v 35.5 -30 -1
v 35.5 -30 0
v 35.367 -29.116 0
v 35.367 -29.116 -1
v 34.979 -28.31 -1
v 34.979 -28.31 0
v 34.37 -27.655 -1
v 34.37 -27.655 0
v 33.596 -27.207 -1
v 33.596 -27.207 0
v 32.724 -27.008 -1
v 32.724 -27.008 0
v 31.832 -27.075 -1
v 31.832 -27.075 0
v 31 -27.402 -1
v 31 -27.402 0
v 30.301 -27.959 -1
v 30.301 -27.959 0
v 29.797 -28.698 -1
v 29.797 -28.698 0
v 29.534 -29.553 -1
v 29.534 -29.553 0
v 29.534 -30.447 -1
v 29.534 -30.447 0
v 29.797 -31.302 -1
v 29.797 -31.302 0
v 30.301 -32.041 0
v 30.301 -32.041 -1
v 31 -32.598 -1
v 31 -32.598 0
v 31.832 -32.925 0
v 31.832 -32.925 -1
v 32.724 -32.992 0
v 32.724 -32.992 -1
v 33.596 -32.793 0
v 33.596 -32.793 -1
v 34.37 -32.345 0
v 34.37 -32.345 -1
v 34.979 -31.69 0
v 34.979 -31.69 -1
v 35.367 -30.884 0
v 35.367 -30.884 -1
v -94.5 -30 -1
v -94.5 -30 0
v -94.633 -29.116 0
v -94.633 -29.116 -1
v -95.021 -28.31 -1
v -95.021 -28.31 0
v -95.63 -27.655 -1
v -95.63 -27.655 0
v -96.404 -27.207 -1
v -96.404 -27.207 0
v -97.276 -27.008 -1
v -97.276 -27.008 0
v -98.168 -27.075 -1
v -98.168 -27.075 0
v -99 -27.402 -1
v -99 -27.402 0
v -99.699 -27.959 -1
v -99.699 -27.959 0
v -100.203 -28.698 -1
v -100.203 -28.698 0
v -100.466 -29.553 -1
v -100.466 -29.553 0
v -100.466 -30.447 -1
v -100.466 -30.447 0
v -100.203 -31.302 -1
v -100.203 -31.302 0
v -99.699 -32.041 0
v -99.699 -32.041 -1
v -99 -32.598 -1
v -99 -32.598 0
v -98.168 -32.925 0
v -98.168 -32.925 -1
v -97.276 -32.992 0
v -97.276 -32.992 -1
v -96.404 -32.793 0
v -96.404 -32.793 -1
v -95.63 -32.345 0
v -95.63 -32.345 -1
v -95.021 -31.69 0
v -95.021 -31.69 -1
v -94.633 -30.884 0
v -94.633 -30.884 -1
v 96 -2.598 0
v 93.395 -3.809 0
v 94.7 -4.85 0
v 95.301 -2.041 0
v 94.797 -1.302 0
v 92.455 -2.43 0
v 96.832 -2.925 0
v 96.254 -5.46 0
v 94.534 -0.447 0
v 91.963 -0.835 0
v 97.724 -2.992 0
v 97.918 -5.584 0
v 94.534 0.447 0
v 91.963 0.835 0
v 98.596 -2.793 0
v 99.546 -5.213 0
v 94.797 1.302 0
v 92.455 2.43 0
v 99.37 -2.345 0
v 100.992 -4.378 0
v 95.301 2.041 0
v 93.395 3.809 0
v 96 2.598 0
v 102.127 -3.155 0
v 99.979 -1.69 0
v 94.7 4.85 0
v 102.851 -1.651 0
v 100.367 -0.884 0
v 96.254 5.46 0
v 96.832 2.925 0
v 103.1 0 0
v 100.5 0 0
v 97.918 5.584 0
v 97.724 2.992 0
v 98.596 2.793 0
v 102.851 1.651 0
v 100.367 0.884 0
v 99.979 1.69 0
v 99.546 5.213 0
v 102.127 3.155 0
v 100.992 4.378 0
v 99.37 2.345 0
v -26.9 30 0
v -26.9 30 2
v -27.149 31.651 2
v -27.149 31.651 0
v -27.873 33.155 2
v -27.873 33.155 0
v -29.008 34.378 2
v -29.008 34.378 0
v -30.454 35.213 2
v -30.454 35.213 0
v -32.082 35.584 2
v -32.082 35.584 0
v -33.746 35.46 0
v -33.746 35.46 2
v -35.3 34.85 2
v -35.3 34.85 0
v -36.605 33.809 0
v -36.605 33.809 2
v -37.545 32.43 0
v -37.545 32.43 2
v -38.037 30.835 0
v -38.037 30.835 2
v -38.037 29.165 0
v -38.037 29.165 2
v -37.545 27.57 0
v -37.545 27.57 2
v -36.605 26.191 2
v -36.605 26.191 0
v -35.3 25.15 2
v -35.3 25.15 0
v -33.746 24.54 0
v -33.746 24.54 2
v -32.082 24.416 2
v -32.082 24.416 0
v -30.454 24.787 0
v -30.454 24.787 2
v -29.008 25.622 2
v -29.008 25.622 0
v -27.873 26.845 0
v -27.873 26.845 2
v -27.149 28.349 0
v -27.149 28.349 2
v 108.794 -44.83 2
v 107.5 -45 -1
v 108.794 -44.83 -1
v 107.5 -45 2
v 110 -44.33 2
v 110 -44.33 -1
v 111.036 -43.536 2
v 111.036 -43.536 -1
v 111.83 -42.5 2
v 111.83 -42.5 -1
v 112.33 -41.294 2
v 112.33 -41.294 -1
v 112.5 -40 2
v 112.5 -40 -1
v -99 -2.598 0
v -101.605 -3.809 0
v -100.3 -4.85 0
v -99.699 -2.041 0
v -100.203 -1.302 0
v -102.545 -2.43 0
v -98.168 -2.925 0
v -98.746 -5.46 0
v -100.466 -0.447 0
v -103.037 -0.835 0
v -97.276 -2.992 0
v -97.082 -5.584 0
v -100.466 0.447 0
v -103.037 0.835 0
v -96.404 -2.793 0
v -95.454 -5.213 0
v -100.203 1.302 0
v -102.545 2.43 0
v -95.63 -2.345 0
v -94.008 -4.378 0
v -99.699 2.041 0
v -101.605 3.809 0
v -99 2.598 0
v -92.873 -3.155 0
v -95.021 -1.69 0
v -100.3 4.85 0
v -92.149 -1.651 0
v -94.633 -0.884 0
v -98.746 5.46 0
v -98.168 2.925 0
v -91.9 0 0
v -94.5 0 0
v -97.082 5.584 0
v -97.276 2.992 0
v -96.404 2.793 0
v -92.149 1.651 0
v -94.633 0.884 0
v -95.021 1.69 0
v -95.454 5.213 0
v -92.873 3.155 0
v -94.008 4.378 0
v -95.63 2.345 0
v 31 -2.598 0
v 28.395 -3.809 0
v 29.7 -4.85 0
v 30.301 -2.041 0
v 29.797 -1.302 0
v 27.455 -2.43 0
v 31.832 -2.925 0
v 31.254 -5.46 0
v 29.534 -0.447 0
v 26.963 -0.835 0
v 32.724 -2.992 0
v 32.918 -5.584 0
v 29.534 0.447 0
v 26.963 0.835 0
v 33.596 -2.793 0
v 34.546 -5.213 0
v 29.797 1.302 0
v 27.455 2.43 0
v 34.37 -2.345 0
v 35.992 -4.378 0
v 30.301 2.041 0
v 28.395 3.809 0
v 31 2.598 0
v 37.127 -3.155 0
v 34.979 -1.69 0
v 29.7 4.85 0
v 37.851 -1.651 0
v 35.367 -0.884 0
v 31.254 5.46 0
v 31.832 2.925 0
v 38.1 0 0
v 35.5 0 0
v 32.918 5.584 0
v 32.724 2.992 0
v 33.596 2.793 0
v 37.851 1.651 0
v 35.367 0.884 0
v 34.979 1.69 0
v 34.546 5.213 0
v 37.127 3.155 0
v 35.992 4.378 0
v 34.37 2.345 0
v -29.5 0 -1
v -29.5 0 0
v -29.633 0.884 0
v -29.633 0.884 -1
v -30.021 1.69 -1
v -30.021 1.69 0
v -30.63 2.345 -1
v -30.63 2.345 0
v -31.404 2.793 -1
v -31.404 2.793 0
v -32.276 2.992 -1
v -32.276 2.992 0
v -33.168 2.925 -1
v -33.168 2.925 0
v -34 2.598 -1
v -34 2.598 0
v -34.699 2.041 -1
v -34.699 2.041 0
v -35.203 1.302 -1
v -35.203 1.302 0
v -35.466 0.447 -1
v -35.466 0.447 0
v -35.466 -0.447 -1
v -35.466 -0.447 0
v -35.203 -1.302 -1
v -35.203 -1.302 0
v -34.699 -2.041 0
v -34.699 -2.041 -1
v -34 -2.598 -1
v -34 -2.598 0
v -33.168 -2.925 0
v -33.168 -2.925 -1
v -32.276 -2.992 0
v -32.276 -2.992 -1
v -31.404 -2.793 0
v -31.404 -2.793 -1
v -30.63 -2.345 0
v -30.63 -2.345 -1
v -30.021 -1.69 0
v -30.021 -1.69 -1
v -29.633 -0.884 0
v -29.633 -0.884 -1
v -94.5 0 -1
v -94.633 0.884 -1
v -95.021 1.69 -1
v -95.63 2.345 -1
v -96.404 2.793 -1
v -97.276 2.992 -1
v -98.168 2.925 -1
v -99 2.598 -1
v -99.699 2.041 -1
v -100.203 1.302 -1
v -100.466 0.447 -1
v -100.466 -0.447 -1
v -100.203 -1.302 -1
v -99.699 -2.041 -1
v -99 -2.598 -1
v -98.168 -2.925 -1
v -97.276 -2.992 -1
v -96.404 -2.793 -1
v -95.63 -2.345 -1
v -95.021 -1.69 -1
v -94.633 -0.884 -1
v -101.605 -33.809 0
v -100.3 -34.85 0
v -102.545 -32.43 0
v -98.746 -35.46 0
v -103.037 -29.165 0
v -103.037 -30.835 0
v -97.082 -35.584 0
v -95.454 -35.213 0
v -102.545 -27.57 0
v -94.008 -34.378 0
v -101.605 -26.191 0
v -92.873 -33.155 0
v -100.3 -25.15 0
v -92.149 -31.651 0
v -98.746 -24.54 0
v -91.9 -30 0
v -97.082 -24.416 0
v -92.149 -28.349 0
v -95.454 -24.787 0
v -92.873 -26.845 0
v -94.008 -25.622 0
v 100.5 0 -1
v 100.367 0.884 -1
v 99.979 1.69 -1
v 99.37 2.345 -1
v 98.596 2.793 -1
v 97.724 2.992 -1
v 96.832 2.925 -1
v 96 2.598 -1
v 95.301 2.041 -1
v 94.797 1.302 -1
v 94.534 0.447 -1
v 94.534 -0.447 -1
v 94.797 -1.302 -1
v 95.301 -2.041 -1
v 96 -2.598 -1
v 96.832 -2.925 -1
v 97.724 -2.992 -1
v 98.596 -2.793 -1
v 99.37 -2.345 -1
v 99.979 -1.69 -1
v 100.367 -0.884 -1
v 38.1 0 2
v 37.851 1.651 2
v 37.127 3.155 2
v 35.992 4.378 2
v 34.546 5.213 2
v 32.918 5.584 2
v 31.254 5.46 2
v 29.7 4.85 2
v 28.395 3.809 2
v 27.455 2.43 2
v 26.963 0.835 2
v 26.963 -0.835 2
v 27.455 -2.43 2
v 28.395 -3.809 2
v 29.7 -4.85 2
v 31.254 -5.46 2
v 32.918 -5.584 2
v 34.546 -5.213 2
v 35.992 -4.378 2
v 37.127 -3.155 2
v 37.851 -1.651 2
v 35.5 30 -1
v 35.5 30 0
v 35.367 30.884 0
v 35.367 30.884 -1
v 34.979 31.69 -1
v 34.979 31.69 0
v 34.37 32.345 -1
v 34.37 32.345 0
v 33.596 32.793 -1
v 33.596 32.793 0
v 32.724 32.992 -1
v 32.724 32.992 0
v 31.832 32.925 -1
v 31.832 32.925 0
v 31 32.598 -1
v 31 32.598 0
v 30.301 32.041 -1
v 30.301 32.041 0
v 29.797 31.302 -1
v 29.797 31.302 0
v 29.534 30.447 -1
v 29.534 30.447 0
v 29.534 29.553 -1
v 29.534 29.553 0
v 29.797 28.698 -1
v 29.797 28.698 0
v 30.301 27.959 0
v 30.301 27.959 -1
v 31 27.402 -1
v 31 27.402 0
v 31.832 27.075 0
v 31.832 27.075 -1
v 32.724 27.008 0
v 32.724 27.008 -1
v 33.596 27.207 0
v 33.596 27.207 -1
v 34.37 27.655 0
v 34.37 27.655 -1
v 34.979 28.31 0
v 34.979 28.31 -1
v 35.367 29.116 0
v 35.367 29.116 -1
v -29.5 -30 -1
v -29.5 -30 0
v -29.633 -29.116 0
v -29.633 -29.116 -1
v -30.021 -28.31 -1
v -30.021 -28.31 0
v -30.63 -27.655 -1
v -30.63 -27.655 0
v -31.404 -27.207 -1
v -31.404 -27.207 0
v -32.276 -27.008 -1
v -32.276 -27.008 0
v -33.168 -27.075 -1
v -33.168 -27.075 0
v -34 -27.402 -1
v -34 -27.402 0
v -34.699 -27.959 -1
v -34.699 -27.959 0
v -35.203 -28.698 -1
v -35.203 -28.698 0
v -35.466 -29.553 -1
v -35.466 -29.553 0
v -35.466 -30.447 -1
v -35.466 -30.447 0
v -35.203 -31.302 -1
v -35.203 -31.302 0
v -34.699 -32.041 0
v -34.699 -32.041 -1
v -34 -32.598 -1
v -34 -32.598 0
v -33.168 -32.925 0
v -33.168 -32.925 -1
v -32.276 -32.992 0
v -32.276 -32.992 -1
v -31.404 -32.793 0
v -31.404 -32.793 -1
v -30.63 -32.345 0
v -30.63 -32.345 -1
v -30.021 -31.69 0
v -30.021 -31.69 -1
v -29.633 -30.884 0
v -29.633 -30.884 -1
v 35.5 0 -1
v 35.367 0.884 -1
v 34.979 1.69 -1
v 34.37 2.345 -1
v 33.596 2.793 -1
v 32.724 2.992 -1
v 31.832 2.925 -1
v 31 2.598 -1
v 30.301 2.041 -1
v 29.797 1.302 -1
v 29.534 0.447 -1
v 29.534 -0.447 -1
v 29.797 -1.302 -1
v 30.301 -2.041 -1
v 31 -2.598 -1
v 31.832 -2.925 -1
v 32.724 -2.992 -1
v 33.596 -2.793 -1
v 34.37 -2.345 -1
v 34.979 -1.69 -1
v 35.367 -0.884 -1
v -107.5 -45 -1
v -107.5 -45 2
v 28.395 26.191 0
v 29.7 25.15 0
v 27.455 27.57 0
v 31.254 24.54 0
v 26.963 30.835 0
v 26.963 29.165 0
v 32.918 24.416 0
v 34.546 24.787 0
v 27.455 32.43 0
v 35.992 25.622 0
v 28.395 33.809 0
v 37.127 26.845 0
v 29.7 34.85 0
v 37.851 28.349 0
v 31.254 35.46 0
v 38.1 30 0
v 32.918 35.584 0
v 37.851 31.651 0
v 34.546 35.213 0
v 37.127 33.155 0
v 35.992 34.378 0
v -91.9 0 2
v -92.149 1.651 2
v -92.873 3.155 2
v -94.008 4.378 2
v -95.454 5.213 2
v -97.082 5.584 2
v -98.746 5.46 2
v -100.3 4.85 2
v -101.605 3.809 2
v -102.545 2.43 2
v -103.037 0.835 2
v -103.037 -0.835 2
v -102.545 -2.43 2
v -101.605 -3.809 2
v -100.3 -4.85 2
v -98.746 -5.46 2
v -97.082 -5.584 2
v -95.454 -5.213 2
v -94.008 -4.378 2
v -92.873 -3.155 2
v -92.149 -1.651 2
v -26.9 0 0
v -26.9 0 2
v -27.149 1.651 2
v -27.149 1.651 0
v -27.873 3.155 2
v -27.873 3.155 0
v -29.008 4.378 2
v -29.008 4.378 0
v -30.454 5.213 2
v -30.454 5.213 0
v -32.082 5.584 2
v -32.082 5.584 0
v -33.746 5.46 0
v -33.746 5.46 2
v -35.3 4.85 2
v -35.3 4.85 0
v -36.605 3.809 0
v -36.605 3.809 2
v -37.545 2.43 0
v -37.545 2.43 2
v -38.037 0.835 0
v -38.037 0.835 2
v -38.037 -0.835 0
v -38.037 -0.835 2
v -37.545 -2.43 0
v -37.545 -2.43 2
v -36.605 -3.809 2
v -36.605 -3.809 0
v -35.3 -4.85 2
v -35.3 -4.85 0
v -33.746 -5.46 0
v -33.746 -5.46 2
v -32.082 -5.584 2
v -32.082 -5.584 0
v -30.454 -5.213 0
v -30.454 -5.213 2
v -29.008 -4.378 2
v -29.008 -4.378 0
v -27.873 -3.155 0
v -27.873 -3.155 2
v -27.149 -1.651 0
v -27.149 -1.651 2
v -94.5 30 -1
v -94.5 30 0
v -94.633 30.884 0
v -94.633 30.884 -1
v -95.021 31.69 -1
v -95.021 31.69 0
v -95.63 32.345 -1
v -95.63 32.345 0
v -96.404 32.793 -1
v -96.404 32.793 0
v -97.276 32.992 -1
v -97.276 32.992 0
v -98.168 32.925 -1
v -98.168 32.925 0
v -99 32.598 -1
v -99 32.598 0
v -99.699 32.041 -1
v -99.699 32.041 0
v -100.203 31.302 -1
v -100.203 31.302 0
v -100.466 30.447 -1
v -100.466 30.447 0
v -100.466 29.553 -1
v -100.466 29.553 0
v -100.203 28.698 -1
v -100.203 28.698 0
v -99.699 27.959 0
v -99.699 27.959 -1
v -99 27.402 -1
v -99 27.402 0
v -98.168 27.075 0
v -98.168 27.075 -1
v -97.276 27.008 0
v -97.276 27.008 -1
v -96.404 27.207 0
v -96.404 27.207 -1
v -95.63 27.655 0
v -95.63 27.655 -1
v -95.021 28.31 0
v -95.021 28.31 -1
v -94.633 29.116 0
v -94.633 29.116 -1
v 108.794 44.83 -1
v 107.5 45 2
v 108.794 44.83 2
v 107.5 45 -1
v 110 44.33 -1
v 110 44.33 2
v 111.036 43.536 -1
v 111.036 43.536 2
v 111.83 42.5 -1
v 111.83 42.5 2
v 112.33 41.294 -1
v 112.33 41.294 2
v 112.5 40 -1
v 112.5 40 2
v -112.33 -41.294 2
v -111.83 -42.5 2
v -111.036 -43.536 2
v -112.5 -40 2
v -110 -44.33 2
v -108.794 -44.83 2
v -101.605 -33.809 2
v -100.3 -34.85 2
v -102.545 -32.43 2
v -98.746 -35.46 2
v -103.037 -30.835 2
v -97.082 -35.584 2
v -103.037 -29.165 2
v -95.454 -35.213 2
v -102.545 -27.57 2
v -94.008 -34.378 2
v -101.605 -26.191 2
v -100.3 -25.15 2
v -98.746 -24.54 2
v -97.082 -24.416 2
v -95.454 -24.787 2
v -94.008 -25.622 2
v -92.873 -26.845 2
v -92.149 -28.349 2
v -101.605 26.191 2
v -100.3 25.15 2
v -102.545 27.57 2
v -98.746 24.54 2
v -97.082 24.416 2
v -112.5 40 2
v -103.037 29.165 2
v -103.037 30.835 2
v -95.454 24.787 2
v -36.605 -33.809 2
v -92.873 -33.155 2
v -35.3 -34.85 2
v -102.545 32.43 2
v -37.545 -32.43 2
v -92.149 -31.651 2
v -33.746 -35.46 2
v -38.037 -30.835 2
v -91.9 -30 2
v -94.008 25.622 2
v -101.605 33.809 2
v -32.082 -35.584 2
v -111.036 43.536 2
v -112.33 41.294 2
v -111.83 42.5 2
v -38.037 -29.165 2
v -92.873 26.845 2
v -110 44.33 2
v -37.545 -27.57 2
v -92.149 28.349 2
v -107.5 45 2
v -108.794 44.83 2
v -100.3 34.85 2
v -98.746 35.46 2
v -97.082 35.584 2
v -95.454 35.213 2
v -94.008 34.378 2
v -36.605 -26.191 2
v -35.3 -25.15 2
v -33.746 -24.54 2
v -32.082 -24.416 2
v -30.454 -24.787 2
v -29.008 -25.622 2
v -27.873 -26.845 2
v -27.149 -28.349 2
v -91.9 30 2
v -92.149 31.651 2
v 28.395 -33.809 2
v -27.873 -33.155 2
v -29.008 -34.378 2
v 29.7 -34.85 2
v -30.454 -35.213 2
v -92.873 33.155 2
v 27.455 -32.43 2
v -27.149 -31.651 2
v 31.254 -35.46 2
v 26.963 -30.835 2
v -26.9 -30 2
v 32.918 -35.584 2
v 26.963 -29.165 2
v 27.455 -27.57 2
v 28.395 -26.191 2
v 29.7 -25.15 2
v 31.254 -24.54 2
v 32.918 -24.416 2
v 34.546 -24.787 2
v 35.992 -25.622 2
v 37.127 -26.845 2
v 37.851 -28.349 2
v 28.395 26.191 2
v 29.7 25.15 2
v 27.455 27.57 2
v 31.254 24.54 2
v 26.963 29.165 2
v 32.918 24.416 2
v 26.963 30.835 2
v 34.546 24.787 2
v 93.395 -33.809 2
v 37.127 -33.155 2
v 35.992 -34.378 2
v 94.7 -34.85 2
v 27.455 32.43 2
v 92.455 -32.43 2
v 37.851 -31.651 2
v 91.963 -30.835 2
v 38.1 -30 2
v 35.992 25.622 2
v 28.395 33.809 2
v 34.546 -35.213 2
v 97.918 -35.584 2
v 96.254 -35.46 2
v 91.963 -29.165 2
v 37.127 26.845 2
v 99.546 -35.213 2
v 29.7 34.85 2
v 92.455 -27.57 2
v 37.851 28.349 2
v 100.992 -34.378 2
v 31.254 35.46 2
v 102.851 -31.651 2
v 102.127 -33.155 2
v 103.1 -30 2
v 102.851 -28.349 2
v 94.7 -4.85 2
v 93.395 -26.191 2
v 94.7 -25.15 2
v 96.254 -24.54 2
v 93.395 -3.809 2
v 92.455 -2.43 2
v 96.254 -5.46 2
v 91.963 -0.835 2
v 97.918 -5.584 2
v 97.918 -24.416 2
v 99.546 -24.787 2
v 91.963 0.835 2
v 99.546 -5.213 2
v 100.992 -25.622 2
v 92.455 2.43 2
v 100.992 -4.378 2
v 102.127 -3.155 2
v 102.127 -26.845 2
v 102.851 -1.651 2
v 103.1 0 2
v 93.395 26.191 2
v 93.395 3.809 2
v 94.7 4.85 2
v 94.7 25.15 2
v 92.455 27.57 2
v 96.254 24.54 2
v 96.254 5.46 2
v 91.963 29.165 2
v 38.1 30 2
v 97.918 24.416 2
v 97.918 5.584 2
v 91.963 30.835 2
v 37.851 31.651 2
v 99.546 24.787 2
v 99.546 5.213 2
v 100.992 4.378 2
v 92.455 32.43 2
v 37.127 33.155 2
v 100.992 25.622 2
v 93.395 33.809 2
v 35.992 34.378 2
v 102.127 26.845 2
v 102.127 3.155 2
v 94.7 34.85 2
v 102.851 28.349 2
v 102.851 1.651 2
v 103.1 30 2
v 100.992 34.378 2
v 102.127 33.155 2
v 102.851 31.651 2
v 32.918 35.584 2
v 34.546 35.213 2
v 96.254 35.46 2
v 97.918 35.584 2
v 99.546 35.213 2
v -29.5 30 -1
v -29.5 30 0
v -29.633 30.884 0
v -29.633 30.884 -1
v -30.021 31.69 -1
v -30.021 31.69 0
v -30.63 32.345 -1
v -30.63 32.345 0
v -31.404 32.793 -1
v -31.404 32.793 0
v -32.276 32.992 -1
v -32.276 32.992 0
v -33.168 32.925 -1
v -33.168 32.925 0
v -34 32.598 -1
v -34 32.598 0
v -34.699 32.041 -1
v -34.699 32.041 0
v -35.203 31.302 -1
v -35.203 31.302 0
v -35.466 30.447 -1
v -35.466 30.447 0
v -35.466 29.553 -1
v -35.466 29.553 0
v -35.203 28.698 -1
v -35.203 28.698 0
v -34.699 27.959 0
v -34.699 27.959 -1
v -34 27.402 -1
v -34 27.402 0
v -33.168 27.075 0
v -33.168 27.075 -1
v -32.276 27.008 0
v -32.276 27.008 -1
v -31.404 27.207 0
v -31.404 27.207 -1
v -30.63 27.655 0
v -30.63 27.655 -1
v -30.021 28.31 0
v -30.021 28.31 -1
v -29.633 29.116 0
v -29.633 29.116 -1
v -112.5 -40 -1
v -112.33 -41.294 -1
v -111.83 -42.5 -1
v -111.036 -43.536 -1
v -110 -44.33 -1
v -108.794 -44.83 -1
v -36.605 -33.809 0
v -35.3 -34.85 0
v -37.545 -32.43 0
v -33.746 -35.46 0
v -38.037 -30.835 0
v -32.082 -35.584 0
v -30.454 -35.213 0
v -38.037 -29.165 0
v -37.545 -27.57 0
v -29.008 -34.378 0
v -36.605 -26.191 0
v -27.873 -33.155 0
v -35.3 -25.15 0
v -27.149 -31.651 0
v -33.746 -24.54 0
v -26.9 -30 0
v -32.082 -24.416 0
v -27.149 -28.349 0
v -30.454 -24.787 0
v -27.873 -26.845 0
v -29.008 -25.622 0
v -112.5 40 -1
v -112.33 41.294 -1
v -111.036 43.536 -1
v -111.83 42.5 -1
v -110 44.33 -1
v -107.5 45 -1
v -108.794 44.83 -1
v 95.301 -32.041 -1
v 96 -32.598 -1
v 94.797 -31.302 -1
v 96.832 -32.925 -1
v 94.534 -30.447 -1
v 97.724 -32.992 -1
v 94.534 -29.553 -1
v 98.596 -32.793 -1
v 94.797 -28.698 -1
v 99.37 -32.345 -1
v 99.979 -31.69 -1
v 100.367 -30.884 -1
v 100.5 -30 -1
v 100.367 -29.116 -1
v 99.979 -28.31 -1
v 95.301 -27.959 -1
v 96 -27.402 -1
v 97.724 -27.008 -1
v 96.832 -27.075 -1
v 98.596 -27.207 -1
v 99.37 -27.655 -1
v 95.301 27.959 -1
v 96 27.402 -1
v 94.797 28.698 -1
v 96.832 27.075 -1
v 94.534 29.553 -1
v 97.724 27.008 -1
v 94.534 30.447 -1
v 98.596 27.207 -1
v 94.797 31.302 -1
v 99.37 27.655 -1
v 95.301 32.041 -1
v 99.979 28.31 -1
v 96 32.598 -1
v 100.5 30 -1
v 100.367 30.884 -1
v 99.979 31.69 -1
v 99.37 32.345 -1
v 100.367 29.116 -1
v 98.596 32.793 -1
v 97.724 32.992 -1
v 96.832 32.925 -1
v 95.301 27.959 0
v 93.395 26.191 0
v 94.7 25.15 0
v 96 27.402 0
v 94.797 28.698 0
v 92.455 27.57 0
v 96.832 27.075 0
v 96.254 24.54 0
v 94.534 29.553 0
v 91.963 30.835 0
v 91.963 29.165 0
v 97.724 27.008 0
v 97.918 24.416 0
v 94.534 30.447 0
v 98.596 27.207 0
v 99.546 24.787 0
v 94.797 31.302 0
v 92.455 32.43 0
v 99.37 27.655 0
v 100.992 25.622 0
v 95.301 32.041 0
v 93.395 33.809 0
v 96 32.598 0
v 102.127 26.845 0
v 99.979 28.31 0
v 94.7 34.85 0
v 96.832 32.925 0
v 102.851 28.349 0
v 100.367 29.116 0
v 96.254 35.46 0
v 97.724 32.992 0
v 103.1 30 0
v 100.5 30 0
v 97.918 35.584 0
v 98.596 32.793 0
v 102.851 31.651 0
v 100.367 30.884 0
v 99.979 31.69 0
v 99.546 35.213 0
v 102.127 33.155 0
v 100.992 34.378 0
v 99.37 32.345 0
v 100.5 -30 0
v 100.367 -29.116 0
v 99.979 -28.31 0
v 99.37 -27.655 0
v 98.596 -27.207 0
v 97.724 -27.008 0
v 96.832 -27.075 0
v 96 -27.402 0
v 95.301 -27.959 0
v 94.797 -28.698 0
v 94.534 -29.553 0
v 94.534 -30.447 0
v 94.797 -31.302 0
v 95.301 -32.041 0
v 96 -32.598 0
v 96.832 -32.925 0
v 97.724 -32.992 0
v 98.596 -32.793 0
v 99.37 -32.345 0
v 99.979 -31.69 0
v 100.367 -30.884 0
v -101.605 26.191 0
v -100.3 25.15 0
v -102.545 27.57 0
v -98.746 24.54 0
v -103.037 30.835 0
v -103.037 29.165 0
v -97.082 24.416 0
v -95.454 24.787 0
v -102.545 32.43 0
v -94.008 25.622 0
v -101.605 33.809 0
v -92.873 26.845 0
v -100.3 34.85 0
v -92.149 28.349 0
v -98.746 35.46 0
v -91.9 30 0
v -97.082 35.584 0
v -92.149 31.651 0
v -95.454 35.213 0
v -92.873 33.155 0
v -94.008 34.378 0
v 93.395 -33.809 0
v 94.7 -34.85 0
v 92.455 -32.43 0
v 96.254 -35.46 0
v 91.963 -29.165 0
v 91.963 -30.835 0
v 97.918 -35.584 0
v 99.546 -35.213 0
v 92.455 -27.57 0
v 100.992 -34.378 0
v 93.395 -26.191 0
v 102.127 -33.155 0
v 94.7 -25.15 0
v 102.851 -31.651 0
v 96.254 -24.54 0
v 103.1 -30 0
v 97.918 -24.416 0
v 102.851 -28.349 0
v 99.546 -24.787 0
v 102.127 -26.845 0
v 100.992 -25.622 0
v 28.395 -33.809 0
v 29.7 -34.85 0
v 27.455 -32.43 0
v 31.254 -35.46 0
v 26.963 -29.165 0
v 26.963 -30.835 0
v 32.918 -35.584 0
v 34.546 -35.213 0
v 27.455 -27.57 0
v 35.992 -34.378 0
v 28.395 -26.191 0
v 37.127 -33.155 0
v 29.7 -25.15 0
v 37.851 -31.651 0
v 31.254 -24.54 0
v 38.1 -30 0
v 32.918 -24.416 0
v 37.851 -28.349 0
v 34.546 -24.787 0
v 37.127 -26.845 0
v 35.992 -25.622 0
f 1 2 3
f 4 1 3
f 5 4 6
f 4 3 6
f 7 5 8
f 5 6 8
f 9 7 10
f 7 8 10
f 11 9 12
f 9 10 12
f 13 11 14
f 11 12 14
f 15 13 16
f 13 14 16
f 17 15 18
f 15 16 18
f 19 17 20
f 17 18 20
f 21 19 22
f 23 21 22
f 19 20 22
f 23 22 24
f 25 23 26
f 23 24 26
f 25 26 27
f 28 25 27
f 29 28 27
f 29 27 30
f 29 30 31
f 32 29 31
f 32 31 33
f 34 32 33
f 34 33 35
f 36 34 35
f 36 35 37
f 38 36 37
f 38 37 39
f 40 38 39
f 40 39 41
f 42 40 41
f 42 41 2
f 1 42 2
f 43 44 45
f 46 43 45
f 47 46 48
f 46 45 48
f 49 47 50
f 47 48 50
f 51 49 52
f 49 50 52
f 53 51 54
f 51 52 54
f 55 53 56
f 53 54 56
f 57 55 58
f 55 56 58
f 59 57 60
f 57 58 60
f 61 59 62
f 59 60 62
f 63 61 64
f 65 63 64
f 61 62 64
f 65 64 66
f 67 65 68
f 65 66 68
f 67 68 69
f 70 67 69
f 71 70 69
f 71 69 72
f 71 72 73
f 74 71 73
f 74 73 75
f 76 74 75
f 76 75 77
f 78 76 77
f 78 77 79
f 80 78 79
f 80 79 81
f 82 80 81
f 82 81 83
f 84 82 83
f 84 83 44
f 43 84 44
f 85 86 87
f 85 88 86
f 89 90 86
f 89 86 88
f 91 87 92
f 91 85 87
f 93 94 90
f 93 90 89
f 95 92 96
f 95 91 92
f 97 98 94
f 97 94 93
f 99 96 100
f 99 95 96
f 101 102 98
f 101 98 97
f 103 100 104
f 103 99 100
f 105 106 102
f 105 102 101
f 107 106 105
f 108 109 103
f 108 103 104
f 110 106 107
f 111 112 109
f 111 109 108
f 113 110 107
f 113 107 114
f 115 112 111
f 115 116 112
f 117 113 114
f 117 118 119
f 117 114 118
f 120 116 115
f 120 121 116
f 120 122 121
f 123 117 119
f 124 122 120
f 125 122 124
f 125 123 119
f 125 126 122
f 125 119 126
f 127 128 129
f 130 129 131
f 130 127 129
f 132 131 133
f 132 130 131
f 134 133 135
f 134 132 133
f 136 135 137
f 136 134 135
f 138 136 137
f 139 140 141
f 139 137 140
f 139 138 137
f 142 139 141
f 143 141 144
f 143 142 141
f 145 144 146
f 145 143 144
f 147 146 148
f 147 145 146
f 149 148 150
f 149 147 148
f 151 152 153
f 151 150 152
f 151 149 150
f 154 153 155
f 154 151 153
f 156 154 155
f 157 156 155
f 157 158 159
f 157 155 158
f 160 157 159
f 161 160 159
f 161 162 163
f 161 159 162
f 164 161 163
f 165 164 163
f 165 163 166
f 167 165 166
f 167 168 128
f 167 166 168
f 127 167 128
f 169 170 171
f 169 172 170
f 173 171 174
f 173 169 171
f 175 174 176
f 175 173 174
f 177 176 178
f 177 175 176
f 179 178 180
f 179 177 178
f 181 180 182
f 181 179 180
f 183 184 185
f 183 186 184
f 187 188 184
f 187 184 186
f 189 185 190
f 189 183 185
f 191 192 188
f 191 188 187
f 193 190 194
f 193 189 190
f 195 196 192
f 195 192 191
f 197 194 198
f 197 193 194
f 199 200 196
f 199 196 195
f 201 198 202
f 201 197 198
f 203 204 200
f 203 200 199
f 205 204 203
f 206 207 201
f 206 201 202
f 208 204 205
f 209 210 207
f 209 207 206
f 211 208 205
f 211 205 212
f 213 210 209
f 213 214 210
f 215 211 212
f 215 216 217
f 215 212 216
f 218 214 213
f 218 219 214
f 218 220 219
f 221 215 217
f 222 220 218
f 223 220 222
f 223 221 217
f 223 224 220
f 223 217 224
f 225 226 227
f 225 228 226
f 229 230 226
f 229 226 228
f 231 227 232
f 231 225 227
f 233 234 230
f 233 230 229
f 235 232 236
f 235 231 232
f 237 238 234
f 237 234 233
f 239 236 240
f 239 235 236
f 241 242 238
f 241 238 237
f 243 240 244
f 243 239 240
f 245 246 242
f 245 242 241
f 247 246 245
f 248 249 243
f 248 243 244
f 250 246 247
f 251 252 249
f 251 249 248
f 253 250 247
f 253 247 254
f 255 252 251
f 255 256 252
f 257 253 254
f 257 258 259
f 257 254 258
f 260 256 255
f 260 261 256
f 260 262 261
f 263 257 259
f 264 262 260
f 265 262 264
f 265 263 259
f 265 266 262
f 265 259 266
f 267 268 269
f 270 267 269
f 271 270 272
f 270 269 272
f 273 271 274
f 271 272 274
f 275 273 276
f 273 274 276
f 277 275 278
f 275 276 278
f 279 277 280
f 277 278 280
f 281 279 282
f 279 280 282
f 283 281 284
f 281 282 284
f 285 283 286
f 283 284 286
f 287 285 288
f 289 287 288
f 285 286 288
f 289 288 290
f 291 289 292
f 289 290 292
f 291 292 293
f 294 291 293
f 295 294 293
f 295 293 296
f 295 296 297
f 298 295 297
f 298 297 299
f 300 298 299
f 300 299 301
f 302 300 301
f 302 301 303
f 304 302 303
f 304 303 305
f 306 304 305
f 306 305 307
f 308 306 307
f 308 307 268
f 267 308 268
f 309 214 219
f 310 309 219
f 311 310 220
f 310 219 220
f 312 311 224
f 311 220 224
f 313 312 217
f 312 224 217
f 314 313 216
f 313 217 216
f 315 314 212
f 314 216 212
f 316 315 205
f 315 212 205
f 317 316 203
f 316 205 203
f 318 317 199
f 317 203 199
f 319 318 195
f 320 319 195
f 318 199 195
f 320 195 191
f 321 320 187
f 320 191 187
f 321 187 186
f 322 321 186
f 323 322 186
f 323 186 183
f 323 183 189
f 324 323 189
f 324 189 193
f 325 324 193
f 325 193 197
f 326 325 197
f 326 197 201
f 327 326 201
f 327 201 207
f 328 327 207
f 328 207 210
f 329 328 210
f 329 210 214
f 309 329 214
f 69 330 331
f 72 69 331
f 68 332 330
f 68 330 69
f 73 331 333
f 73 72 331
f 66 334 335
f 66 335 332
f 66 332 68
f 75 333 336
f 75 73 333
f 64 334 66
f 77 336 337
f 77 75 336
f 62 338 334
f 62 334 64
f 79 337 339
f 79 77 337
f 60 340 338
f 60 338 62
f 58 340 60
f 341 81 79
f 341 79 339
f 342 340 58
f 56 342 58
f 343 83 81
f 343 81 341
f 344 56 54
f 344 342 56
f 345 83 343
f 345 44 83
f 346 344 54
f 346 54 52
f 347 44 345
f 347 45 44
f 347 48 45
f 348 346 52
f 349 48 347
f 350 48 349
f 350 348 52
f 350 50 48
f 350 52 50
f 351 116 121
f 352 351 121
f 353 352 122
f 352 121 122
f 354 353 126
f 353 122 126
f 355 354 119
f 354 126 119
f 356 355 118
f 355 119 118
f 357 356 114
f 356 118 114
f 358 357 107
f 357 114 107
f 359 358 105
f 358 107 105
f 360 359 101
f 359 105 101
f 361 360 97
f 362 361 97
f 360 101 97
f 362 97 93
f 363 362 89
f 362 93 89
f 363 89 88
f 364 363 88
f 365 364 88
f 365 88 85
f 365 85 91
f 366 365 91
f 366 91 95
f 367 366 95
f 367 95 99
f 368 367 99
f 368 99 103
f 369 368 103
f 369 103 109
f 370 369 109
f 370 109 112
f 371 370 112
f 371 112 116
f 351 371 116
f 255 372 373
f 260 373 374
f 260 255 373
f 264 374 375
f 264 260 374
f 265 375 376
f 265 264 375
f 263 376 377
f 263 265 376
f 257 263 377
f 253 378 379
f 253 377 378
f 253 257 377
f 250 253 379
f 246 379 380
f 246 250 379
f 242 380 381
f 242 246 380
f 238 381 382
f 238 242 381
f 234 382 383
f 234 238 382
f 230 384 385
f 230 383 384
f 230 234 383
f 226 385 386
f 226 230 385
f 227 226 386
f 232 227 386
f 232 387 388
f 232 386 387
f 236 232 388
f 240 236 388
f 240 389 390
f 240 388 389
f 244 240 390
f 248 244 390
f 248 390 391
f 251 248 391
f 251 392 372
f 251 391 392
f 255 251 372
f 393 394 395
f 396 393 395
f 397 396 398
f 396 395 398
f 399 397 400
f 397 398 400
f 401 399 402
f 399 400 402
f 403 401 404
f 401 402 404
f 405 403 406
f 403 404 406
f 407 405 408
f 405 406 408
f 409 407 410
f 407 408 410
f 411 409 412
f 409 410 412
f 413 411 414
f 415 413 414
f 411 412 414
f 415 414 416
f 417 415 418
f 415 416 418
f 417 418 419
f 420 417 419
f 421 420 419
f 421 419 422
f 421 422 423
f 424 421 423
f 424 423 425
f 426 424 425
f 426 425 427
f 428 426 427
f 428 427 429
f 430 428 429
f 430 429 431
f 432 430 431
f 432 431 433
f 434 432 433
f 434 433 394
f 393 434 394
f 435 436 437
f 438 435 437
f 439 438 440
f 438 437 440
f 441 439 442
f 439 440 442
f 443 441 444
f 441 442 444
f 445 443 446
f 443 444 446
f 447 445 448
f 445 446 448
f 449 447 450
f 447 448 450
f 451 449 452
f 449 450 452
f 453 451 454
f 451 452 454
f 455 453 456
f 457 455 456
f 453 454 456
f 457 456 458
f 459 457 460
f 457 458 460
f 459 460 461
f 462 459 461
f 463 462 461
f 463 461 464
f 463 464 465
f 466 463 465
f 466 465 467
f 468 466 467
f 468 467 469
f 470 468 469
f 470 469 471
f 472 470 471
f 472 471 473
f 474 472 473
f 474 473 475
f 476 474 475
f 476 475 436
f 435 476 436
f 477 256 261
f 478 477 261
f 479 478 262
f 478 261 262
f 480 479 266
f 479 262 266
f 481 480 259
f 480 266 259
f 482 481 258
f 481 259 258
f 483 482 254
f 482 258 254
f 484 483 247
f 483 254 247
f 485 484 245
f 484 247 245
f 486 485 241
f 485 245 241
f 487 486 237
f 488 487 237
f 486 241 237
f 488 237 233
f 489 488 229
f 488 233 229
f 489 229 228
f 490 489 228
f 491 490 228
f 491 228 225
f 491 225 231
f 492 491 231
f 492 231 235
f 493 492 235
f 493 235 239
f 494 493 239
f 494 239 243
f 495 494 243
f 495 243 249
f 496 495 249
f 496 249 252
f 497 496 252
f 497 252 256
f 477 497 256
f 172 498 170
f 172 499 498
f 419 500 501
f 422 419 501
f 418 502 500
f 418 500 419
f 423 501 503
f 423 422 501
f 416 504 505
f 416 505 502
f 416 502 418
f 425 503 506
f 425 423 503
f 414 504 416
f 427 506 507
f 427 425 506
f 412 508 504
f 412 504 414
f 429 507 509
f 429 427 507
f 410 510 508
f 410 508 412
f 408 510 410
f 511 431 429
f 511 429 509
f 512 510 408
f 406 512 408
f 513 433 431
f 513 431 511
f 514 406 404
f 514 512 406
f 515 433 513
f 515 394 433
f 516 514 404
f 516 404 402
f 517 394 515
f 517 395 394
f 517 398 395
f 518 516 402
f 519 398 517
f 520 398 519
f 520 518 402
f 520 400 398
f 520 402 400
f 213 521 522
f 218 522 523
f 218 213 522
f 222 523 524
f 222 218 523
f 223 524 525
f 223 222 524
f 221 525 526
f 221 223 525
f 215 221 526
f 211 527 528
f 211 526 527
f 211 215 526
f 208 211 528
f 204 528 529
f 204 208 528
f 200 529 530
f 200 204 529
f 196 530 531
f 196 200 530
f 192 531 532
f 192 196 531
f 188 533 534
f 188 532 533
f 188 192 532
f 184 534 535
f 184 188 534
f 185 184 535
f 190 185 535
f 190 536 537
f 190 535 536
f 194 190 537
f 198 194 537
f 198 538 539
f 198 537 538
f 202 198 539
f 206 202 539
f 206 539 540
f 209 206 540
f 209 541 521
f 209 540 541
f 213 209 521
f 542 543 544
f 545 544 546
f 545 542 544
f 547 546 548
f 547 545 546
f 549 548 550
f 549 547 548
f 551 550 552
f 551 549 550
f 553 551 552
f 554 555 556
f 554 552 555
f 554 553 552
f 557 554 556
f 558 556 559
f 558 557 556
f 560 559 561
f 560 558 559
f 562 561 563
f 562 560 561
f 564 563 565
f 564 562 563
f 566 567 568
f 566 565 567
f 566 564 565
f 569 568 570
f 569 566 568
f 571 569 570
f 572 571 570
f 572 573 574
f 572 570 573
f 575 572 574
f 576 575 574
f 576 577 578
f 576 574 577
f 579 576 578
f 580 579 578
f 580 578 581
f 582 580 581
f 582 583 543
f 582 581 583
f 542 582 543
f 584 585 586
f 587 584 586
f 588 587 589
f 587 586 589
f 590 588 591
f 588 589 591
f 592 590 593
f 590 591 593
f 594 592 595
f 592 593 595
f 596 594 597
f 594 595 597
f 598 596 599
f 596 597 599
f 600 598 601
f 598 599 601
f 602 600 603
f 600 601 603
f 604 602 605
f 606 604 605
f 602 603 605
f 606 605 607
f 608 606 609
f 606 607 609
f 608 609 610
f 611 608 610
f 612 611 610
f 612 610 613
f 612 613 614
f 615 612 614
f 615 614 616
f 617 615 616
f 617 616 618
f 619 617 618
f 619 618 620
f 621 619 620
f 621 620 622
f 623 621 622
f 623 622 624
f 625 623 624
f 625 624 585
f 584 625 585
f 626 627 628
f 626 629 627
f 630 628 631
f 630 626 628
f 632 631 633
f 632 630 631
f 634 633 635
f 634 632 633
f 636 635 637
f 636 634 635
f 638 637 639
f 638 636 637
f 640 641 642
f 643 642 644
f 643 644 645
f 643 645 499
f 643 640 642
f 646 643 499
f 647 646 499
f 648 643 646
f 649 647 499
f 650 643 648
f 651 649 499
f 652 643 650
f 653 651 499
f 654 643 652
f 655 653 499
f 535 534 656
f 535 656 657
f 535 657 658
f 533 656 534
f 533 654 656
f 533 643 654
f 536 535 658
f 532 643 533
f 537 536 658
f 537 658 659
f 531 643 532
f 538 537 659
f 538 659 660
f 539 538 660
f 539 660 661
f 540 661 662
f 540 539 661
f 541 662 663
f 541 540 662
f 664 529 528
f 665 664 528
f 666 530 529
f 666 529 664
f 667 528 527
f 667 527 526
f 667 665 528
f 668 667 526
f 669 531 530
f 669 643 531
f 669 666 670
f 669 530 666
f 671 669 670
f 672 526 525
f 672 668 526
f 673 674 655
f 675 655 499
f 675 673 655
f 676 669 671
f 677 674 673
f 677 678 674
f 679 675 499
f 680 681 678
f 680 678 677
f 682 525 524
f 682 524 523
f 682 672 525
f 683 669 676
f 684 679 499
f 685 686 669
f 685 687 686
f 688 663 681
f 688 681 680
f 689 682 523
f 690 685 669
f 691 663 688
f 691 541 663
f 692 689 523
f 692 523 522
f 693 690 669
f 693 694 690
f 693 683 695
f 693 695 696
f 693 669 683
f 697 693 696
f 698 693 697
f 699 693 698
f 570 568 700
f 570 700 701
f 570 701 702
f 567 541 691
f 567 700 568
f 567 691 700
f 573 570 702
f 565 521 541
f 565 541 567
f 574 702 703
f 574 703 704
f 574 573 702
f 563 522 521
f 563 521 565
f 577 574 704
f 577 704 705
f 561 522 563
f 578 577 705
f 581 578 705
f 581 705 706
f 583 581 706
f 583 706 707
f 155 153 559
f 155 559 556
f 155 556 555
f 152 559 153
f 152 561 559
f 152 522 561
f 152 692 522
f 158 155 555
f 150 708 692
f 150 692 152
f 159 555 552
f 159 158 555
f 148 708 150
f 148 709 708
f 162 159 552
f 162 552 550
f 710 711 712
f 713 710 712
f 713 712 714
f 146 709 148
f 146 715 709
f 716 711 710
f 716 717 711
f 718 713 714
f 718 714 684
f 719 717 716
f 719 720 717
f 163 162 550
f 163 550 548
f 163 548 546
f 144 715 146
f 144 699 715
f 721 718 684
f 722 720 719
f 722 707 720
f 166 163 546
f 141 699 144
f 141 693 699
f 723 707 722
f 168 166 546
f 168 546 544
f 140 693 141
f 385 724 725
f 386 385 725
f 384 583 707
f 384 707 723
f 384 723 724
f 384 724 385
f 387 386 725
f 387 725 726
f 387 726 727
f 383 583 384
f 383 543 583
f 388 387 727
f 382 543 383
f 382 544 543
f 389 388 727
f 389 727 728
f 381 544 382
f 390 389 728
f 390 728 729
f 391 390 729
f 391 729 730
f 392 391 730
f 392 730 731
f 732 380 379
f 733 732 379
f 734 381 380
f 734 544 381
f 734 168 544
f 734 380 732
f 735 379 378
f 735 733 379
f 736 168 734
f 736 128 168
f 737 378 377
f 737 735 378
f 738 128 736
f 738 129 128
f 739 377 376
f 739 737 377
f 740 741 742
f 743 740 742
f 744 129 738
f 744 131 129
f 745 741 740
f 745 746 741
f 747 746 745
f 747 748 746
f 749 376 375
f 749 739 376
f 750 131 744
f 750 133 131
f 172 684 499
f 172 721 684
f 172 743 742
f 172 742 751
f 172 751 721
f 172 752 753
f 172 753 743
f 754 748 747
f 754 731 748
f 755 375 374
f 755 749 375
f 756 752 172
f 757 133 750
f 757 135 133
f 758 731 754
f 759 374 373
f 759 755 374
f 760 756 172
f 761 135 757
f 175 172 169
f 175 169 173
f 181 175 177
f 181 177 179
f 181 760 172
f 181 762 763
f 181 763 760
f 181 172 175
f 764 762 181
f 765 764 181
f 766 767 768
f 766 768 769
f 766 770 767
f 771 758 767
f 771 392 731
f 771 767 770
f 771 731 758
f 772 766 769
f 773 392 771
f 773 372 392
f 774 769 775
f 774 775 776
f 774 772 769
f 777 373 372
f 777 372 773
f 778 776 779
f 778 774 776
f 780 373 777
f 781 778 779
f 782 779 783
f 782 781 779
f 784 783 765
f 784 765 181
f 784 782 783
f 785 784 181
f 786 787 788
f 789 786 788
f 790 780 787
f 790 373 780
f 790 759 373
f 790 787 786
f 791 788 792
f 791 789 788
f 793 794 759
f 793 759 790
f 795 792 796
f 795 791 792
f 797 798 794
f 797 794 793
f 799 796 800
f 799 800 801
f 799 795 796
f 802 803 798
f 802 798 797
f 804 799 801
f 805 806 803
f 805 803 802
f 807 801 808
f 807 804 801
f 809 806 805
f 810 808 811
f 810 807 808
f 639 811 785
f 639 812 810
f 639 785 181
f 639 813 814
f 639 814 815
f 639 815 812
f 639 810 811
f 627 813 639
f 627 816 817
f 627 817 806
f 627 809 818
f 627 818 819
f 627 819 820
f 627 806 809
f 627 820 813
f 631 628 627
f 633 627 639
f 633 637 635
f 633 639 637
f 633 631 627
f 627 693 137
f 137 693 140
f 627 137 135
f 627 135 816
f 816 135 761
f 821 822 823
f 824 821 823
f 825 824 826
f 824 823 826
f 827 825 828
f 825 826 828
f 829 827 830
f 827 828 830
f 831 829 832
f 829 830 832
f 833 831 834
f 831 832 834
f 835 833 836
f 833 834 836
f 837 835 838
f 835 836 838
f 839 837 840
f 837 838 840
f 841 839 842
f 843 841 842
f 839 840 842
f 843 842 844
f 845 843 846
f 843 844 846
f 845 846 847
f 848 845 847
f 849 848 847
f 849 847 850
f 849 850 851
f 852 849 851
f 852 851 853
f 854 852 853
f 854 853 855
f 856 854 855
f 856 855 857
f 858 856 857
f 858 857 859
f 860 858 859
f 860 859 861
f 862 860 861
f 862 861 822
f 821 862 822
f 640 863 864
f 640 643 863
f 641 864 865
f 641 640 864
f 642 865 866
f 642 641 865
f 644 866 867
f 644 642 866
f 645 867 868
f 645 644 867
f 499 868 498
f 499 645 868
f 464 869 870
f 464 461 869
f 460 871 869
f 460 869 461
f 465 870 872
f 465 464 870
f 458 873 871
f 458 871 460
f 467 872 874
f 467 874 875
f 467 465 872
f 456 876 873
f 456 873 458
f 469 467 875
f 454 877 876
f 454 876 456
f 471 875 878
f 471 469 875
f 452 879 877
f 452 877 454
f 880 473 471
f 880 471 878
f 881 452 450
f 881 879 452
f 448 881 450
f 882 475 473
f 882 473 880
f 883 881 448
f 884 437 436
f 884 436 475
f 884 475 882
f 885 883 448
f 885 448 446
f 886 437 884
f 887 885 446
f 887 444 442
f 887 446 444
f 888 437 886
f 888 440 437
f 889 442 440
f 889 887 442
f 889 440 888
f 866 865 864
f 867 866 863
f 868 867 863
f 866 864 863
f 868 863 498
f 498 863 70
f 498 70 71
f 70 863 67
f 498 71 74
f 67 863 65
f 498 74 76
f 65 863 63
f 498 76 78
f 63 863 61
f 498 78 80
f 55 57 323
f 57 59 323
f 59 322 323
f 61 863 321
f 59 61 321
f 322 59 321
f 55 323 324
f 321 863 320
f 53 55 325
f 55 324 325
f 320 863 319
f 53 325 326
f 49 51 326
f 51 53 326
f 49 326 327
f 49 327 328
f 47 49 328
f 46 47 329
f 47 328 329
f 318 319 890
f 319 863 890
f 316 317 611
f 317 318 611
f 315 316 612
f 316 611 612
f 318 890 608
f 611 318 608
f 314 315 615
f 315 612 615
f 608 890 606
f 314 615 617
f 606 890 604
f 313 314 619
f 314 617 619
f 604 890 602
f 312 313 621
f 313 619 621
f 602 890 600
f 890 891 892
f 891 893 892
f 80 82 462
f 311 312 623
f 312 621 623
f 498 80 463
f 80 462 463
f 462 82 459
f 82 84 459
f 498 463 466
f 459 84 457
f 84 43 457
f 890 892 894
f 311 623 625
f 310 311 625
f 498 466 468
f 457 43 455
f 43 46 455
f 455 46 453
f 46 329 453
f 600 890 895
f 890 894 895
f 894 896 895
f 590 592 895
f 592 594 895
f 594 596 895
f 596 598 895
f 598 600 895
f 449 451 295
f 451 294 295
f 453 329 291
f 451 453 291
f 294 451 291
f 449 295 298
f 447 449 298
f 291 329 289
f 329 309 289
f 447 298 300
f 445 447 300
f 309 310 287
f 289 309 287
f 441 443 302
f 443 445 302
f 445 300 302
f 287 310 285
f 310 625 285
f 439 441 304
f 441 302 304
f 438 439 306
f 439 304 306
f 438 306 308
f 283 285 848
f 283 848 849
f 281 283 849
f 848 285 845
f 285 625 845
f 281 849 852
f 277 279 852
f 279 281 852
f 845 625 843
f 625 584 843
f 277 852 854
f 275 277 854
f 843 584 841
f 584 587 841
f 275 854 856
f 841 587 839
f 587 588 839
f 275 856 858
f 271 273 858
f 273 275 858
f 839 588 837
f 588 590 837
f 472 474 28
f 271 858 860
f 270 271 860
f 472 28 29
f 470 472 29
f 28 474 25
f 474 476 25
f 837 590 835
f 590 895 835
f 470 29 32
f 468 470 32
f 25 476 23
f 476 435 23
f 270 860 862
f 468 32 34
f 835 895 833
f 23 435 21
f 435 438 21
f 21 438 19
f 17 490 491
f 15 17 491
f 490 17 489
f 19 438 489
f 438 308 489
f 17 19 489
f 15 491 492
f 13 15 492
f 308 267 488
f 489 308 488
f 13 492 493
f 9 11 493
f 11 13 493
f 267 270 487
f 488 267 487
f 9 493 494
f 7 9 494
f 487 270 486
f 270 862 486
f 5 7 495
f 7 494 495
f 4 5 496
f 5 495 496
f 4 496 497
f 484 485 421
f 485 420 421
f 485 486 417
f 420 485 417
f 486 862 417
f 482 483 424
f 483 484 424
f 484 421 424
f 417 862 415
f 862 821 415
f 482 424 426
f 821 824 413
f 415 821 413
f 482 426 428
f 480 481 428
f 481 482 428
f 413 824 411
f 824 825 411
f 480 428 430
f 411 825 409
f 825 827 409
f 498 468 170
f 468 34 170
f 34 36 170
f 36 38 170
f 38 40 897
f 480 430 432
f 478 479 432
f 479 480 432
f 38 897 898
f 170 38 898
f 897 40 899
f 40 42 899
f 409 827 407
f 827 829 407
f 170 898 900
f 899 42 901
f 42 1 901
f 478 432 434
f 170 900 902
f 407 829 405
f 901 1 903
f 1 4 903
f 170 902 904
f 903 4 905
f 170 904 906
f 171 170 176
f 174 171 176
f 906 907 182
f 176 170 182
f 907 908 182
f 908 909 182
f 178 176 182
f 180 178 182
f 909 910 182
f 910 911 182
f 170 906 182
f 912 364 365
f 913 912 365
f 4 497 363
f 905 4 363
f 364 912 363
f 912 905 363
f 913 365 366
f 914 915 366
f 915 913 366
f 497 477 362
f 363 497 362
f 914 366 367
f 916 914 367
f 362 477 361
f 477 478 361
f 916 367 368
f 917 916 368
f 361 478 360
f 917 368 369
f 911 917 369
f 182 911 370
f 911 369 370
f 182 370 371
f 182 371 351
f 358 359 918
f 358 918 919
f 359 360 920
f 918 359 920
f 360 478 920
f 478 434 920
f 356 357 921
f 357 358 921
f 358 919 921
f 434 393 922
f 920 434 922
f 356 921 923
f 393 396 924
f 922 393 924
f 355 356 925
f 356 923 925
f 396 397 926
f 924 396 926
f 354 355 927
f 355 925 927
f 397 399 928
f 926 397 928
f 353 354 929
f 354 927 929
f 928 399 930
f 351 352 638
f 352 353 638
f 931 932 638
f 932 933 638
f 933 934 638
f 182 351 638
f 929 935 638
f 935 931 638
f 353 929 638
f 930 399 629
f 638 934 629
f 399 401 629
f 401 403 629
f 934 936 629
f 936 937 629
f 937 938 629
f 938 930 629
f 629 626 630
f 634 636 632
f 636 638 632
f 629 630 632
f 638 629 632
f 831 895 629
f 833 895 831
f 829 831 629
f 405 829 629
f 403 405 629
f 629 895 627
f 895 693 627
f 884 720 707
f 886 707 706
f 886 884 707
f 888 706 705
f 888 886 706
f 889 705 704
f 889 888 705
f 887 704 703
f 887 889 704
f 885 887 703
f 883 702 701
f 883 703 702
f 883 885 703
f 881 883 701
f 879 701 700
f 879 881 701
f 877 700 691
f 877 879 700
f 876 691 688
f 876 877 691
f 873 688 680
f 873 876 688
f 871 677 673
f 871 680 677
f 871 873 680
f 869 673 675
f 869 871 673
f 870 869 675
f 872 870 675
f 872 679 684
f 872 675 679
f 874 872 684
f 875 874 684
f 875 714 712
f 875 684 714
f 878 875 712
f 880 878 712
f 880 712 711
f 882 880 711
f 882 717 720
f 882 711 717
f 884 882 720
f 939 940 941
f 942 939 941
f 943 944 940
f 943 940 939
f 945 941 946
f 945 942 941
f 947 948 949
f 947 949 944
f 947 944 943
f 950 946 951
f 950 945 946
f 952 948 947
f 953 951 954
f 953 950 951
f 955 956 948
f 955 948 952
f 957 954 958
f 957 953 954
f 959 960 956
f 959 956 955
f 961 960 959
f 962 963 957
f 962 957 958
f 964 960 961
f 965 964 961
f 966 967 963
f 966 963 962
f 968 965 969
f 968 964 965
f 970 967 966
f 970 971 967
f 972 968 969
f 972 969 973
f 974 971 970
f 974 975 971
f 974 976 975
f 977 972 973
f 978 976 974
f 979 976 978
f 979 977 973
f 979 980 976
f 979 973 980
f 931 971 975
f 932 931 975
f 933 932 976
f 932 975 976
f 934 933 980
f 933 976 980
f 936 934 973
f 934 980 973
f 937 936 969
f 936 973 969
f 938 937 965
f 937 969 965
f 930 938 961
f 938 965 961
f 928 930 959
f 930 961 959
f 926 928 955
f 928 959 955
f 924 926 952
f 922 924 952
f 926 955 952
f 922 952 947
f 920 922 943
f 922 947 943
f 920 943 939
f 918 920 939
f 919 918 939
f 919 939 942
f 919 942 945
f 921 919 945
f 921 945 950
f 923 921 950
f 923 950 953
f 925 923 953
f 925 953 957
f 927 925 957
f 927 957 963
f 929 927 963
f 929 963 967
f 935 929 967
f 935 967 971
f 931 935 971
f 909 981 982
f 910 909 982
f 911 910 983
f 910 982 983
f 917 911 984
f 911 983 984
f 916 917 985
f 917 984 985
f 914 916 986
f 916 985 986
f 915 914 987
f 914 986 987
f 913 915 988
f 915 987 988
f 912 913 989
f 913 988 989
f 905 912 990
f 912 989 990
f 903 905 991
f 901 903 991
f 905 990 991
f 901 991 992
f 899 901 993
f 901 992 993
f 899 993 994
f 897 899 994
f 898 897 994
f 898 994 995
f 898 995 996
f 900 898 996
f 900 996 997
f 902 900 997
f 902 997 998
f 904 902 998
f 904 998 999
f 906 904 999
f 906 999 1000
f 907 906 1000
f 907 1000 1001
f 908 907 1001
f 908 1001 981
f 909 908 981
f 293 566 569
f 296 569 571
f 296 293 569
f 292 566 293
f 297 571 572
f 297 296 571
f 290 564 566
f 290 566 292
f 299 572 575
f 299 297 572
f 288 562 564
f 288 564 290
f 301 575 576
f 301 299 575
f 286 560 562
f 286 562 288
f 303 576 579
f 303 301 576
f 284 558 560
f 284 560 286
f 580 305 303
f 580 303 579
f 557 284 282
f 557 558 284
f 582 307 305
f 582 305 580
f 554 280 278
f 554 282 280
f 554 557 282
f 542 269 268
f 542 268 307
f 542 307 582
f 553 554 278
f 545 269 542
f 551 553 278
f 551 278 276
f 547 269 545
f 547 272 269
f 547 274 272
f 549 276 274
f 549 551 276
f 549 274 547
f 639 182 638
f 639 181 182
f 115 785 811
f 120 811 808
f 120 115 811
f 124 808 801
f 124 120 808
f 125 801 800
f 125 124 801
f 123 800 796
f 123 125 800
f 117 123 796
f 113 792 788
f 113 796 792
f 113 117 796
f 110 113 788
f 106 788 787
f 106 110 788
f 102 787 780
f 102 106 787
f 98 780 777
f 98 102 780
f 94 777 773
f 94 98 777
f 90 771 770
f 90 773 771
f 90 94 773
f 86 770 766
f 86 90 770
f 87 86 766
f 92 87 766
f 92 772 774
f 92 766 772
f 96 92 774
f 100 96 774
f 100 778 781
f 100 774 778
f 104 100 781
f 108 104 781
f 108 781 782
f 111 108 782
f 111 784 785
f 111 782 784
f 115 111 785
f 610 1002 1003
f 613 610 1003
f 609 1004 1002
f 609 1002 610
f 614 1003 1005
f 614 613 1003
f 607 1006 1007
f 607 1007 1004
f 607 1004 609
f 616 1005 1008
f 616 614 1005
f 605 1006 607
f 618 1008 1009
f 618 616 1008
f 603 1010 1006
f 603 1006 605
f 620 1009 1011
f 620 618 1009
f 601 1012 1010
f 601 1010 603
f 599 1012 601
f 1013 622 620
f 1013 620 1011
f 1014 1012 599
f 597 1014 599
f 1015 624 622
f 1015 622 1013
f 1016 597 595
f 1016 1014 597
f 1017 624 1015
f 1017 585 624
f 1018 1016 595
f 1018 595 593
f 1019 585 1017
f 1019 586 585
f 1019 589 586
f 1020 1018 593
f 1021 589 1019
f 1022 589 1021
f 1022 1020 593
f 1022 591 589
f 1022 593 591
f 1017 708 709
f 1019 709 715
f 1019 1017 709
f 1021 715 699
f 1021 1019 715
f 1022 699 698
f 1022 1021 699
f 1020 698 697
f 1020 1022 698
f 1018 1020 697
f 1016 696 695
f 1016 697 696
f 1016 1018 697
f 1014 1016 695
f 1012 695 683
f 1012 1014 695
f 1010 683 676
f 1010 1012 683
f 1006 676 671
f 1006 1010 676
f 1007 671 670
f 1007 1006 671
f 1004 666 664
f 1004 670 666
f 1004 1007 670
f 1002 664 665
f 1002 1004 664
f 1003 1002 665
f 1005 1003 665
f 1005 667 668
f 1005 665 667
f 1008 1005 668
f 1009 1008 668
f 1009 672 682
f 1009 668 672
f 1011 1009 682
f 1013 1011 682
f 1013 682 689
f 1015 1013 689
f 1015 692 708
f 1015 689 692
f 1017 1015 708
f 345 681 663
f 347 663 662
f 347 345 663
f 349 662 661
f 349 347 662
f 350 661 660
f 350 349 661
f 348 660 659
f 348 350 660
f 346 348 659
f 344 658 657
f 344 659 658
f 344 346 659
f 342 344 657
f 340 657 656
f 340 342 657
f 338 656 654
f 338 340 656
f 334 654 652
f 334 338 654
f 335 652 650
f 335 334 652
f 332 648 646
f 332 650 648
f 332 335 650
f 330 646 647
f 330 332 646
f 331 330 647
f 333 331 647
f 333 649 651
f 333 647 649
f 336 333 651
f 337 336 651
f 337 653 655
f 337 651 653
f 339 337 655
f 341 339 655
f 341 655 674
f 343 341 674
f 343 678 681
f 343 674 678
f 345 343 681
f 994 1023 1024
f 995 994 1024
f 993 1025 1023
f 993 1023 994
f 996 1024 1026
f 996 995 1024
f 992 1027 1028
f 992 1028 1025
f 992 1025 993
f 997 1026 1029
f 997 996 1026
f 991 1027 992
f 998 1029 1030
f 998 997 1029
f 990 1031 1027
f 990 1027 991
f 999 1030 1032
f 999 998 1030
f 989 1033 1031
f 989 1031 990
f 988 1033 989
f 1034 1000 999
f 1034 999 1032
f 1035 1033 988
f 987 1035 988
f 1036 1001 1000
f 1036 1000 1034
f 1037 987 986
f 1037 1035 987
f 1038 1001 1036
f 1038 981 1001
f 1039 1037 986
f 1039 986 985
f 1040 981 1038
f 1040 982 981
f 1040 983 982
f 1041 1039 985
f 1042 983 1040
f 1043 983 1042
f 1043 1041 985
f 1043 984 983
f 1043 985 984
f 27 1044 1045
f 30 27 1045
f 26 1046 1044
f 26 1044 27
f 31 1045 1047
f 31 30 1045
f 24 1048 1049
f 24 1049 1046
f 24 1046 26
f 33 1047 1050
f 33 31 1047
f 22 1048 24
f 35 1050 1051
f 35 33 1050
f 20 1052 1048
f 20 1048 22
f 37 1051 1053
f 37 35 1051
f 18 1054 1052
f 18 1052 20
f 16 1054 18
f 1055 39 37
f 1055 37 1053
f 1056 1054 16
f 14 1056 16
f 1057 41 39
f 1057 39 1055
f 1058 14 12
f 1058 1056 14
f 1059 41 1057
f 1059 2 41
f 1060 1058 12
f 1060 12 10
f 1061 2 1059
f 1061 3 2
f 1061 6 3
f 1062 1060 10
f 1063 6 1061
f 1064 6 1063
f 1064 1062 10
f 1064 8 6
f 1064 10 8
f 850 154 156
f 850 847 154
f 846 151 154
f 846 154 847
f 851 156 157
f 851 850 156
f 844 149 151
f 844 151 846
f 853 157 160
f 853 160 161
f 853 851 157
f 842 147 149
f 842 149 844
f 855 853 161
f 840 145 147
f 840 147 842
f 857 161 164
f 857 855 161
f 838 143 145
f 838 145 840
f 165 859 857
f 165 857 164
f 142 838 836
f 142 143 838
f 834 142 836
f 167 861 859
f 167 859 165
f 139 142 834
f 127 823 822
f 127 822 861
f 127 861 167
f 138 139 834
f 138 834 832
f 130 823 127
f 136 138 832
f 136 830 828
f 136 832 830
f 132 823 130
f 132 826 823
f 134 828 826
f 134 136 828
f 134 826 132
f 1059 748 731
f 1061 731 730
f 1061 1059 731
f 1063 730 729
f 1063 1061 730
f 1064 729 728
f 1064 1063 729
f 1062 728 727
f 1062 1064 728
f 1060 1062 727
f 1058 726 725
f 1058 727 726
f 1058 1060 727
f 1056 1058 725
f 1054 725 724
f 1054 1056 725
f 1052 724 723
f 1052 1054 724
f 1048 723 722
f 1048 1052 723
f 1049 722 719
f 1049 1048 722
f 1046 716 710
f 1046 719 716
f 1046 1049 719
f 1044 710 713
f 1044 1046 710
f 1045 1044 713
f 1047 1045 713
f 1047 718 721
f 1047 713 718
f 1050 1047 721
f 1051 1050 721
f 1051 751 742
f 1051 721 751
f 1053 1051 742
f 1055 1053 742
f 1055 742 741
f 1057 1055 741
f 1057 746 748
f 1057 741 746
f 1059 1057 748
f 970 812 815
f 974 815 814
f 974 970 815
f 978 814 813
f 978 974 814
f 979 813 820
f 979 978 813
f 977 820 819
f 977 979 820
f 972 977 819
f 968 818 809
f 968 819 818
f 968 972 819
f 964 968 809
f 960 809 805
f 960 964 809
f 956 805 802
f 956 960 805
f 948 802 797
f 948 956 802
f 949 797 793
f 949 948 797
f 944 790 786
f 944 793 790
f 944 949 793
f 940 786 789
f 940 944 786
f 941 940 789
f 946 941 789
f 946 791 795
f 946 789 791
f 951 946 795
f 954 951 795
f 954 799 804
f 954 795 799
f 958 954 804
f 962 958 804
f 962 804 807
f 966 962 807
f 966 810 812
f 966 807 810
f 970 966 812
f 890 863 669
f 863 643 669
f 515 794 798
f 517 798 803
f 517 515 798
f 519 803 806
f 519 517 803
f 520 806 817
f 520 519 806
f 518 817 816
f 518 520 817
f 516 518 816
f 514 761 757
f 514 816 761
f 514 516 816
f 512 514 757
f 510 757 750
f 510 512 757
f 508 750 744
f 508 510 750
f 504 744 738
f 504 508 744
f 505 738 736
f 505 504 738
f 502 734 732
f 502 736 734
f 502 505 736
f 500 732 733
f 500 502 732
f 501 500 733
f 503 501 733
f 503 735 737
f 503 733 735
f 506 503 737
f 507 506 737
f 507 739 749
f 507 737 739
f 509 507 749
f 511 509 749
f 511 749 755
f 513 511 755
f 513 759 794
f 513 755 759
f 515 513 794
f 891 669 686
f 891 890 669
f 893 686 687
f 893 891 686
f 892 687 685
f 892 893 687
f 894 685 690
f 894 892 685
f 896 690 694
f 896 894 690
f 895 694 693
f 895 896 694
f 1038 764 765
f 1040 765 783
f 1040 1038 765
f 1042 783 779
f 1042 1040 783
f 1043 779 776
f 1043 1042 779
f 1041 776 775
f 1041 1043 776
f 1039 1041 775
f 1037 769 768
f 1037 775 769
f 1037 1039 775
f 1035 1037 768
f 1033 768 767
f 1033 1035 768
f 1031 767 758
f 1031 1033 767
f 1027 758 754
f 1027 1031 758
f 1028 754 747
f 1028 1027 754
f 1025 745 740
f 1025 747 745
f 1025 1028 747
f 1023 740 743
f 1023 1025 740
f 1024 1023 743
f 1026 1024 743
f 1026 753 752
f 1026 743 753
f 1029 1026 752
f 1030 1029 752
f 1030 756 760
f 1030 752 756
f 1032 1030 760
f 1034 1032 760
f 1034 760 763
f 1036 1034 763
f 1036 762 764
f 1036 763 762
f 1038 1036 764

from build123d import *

# Parameters (mm, degrees)
SKETCH001_W     = 225
SKETCH001_H     = 90
PAD_DEPTH       = 2
PAD_DEPTH_BACK  = 1
SKETCH_R        = 5.6
POCKET_DEPTH    = 2.001
SKETCH004_R     = 3
POCKET001_DEPTH = 1.001
FILLET_R        = 5


with BuildPart() as part:
    # Sketch001 → Pad (new body, two sides)
    with BuildSketch(Plane.XY) as pad_sk:
        Rectangle(SKETCH001_W, SKETCH001_H)
    extrude(amount=PAD_DEPTH)
    extrude(pad_sk.sketch, amount=-PAD_DEPTH_BACK)

    # Sketch → Pocket (cut, through all)
    with BuildSketch(Plane.XY):
        with Locations((-97.5, 30)):
            Circle(SKETCH_R)
        with Locations((-32.5, 30)):
            Circle(SKETCH_R)
        with Locations((32.5, 30)):
            Circle(SKETCH_R)
        with Locations((97.5, 30)):
            Circle(SKETCH_R)
        with Locations((-97.5, 0)):
            Circle(SKETCH_R)
        with Locations((-32.5, 0)):
            Circle(SKETCH_R)
        with Locations((32.5, 0)):
            Circle(SKETCH_R)
        with Locations((97.5, 0)):
            Circle(SKETCH_R)
        with Locations((-97.5, -30)):
            Circle(SKETCH_R)
        with Locations((-32.5, -30)):
            Circle(SKETCH_R)
        with Locations((32.5, -30)):
            Circle(SKETCH_R)
        with Locations((97.5, -30)):
            Circle(SKETCH_R)
    extrude(amount=POCKET_DEPTH, mode=Mode.SUBTRACT)

    # Sketch004 → Pocket001 (cut, through all)
    with BuildSketch(Plane.XY):
        with Locations((-97.5, 30)):
            Circle(SKETCH004_R)
        with Locations((-32.5, 30)):
            Circle(SKETCH004_R)
        with Locations((32.5, 30)):
            Circle(SKETCH004_R)
        with Locations((97.5, 30)):
            Circle(SKETCH004_R)
        with Locations((-97.5, 0)):
            Circle(SKETCH004_R)
        with Locations((-32.5, 0)):
            Circle(SKETCH004_R)
        with Locations((32.5, 0)):
            Circle(SKETCH004_R)
        with Locations((97.5, 0)):
            Circle(SKETCH004_R)
        with Locations((-97.5, -30)):
            Circle(SKETCH004_R)
        with Locations((-32.5, -30)):
            Circle(SKETCH004_R)
        with Locations((32.5, -30)):
            Circle(SKETCH004_R)
        with Locations((97.5, -30)):
            Circle(SKETCH004_R)
    extrude(amount=-POCKET001_DEPTH, mode=Mode.SUBTRACT)

    # Fillet
    fillet_edges = [part.edges().sort_by_distance(p)[0] for p in [
        (-112.5, -45, 0.5),
        (-112.5, 45, 0.5),
        (112.5, -45, 0.5),
        (112.5, 45, 0.5),
    ]]
    fillet(fillet_edges, radius=FILLET_R)


solid = part.part
